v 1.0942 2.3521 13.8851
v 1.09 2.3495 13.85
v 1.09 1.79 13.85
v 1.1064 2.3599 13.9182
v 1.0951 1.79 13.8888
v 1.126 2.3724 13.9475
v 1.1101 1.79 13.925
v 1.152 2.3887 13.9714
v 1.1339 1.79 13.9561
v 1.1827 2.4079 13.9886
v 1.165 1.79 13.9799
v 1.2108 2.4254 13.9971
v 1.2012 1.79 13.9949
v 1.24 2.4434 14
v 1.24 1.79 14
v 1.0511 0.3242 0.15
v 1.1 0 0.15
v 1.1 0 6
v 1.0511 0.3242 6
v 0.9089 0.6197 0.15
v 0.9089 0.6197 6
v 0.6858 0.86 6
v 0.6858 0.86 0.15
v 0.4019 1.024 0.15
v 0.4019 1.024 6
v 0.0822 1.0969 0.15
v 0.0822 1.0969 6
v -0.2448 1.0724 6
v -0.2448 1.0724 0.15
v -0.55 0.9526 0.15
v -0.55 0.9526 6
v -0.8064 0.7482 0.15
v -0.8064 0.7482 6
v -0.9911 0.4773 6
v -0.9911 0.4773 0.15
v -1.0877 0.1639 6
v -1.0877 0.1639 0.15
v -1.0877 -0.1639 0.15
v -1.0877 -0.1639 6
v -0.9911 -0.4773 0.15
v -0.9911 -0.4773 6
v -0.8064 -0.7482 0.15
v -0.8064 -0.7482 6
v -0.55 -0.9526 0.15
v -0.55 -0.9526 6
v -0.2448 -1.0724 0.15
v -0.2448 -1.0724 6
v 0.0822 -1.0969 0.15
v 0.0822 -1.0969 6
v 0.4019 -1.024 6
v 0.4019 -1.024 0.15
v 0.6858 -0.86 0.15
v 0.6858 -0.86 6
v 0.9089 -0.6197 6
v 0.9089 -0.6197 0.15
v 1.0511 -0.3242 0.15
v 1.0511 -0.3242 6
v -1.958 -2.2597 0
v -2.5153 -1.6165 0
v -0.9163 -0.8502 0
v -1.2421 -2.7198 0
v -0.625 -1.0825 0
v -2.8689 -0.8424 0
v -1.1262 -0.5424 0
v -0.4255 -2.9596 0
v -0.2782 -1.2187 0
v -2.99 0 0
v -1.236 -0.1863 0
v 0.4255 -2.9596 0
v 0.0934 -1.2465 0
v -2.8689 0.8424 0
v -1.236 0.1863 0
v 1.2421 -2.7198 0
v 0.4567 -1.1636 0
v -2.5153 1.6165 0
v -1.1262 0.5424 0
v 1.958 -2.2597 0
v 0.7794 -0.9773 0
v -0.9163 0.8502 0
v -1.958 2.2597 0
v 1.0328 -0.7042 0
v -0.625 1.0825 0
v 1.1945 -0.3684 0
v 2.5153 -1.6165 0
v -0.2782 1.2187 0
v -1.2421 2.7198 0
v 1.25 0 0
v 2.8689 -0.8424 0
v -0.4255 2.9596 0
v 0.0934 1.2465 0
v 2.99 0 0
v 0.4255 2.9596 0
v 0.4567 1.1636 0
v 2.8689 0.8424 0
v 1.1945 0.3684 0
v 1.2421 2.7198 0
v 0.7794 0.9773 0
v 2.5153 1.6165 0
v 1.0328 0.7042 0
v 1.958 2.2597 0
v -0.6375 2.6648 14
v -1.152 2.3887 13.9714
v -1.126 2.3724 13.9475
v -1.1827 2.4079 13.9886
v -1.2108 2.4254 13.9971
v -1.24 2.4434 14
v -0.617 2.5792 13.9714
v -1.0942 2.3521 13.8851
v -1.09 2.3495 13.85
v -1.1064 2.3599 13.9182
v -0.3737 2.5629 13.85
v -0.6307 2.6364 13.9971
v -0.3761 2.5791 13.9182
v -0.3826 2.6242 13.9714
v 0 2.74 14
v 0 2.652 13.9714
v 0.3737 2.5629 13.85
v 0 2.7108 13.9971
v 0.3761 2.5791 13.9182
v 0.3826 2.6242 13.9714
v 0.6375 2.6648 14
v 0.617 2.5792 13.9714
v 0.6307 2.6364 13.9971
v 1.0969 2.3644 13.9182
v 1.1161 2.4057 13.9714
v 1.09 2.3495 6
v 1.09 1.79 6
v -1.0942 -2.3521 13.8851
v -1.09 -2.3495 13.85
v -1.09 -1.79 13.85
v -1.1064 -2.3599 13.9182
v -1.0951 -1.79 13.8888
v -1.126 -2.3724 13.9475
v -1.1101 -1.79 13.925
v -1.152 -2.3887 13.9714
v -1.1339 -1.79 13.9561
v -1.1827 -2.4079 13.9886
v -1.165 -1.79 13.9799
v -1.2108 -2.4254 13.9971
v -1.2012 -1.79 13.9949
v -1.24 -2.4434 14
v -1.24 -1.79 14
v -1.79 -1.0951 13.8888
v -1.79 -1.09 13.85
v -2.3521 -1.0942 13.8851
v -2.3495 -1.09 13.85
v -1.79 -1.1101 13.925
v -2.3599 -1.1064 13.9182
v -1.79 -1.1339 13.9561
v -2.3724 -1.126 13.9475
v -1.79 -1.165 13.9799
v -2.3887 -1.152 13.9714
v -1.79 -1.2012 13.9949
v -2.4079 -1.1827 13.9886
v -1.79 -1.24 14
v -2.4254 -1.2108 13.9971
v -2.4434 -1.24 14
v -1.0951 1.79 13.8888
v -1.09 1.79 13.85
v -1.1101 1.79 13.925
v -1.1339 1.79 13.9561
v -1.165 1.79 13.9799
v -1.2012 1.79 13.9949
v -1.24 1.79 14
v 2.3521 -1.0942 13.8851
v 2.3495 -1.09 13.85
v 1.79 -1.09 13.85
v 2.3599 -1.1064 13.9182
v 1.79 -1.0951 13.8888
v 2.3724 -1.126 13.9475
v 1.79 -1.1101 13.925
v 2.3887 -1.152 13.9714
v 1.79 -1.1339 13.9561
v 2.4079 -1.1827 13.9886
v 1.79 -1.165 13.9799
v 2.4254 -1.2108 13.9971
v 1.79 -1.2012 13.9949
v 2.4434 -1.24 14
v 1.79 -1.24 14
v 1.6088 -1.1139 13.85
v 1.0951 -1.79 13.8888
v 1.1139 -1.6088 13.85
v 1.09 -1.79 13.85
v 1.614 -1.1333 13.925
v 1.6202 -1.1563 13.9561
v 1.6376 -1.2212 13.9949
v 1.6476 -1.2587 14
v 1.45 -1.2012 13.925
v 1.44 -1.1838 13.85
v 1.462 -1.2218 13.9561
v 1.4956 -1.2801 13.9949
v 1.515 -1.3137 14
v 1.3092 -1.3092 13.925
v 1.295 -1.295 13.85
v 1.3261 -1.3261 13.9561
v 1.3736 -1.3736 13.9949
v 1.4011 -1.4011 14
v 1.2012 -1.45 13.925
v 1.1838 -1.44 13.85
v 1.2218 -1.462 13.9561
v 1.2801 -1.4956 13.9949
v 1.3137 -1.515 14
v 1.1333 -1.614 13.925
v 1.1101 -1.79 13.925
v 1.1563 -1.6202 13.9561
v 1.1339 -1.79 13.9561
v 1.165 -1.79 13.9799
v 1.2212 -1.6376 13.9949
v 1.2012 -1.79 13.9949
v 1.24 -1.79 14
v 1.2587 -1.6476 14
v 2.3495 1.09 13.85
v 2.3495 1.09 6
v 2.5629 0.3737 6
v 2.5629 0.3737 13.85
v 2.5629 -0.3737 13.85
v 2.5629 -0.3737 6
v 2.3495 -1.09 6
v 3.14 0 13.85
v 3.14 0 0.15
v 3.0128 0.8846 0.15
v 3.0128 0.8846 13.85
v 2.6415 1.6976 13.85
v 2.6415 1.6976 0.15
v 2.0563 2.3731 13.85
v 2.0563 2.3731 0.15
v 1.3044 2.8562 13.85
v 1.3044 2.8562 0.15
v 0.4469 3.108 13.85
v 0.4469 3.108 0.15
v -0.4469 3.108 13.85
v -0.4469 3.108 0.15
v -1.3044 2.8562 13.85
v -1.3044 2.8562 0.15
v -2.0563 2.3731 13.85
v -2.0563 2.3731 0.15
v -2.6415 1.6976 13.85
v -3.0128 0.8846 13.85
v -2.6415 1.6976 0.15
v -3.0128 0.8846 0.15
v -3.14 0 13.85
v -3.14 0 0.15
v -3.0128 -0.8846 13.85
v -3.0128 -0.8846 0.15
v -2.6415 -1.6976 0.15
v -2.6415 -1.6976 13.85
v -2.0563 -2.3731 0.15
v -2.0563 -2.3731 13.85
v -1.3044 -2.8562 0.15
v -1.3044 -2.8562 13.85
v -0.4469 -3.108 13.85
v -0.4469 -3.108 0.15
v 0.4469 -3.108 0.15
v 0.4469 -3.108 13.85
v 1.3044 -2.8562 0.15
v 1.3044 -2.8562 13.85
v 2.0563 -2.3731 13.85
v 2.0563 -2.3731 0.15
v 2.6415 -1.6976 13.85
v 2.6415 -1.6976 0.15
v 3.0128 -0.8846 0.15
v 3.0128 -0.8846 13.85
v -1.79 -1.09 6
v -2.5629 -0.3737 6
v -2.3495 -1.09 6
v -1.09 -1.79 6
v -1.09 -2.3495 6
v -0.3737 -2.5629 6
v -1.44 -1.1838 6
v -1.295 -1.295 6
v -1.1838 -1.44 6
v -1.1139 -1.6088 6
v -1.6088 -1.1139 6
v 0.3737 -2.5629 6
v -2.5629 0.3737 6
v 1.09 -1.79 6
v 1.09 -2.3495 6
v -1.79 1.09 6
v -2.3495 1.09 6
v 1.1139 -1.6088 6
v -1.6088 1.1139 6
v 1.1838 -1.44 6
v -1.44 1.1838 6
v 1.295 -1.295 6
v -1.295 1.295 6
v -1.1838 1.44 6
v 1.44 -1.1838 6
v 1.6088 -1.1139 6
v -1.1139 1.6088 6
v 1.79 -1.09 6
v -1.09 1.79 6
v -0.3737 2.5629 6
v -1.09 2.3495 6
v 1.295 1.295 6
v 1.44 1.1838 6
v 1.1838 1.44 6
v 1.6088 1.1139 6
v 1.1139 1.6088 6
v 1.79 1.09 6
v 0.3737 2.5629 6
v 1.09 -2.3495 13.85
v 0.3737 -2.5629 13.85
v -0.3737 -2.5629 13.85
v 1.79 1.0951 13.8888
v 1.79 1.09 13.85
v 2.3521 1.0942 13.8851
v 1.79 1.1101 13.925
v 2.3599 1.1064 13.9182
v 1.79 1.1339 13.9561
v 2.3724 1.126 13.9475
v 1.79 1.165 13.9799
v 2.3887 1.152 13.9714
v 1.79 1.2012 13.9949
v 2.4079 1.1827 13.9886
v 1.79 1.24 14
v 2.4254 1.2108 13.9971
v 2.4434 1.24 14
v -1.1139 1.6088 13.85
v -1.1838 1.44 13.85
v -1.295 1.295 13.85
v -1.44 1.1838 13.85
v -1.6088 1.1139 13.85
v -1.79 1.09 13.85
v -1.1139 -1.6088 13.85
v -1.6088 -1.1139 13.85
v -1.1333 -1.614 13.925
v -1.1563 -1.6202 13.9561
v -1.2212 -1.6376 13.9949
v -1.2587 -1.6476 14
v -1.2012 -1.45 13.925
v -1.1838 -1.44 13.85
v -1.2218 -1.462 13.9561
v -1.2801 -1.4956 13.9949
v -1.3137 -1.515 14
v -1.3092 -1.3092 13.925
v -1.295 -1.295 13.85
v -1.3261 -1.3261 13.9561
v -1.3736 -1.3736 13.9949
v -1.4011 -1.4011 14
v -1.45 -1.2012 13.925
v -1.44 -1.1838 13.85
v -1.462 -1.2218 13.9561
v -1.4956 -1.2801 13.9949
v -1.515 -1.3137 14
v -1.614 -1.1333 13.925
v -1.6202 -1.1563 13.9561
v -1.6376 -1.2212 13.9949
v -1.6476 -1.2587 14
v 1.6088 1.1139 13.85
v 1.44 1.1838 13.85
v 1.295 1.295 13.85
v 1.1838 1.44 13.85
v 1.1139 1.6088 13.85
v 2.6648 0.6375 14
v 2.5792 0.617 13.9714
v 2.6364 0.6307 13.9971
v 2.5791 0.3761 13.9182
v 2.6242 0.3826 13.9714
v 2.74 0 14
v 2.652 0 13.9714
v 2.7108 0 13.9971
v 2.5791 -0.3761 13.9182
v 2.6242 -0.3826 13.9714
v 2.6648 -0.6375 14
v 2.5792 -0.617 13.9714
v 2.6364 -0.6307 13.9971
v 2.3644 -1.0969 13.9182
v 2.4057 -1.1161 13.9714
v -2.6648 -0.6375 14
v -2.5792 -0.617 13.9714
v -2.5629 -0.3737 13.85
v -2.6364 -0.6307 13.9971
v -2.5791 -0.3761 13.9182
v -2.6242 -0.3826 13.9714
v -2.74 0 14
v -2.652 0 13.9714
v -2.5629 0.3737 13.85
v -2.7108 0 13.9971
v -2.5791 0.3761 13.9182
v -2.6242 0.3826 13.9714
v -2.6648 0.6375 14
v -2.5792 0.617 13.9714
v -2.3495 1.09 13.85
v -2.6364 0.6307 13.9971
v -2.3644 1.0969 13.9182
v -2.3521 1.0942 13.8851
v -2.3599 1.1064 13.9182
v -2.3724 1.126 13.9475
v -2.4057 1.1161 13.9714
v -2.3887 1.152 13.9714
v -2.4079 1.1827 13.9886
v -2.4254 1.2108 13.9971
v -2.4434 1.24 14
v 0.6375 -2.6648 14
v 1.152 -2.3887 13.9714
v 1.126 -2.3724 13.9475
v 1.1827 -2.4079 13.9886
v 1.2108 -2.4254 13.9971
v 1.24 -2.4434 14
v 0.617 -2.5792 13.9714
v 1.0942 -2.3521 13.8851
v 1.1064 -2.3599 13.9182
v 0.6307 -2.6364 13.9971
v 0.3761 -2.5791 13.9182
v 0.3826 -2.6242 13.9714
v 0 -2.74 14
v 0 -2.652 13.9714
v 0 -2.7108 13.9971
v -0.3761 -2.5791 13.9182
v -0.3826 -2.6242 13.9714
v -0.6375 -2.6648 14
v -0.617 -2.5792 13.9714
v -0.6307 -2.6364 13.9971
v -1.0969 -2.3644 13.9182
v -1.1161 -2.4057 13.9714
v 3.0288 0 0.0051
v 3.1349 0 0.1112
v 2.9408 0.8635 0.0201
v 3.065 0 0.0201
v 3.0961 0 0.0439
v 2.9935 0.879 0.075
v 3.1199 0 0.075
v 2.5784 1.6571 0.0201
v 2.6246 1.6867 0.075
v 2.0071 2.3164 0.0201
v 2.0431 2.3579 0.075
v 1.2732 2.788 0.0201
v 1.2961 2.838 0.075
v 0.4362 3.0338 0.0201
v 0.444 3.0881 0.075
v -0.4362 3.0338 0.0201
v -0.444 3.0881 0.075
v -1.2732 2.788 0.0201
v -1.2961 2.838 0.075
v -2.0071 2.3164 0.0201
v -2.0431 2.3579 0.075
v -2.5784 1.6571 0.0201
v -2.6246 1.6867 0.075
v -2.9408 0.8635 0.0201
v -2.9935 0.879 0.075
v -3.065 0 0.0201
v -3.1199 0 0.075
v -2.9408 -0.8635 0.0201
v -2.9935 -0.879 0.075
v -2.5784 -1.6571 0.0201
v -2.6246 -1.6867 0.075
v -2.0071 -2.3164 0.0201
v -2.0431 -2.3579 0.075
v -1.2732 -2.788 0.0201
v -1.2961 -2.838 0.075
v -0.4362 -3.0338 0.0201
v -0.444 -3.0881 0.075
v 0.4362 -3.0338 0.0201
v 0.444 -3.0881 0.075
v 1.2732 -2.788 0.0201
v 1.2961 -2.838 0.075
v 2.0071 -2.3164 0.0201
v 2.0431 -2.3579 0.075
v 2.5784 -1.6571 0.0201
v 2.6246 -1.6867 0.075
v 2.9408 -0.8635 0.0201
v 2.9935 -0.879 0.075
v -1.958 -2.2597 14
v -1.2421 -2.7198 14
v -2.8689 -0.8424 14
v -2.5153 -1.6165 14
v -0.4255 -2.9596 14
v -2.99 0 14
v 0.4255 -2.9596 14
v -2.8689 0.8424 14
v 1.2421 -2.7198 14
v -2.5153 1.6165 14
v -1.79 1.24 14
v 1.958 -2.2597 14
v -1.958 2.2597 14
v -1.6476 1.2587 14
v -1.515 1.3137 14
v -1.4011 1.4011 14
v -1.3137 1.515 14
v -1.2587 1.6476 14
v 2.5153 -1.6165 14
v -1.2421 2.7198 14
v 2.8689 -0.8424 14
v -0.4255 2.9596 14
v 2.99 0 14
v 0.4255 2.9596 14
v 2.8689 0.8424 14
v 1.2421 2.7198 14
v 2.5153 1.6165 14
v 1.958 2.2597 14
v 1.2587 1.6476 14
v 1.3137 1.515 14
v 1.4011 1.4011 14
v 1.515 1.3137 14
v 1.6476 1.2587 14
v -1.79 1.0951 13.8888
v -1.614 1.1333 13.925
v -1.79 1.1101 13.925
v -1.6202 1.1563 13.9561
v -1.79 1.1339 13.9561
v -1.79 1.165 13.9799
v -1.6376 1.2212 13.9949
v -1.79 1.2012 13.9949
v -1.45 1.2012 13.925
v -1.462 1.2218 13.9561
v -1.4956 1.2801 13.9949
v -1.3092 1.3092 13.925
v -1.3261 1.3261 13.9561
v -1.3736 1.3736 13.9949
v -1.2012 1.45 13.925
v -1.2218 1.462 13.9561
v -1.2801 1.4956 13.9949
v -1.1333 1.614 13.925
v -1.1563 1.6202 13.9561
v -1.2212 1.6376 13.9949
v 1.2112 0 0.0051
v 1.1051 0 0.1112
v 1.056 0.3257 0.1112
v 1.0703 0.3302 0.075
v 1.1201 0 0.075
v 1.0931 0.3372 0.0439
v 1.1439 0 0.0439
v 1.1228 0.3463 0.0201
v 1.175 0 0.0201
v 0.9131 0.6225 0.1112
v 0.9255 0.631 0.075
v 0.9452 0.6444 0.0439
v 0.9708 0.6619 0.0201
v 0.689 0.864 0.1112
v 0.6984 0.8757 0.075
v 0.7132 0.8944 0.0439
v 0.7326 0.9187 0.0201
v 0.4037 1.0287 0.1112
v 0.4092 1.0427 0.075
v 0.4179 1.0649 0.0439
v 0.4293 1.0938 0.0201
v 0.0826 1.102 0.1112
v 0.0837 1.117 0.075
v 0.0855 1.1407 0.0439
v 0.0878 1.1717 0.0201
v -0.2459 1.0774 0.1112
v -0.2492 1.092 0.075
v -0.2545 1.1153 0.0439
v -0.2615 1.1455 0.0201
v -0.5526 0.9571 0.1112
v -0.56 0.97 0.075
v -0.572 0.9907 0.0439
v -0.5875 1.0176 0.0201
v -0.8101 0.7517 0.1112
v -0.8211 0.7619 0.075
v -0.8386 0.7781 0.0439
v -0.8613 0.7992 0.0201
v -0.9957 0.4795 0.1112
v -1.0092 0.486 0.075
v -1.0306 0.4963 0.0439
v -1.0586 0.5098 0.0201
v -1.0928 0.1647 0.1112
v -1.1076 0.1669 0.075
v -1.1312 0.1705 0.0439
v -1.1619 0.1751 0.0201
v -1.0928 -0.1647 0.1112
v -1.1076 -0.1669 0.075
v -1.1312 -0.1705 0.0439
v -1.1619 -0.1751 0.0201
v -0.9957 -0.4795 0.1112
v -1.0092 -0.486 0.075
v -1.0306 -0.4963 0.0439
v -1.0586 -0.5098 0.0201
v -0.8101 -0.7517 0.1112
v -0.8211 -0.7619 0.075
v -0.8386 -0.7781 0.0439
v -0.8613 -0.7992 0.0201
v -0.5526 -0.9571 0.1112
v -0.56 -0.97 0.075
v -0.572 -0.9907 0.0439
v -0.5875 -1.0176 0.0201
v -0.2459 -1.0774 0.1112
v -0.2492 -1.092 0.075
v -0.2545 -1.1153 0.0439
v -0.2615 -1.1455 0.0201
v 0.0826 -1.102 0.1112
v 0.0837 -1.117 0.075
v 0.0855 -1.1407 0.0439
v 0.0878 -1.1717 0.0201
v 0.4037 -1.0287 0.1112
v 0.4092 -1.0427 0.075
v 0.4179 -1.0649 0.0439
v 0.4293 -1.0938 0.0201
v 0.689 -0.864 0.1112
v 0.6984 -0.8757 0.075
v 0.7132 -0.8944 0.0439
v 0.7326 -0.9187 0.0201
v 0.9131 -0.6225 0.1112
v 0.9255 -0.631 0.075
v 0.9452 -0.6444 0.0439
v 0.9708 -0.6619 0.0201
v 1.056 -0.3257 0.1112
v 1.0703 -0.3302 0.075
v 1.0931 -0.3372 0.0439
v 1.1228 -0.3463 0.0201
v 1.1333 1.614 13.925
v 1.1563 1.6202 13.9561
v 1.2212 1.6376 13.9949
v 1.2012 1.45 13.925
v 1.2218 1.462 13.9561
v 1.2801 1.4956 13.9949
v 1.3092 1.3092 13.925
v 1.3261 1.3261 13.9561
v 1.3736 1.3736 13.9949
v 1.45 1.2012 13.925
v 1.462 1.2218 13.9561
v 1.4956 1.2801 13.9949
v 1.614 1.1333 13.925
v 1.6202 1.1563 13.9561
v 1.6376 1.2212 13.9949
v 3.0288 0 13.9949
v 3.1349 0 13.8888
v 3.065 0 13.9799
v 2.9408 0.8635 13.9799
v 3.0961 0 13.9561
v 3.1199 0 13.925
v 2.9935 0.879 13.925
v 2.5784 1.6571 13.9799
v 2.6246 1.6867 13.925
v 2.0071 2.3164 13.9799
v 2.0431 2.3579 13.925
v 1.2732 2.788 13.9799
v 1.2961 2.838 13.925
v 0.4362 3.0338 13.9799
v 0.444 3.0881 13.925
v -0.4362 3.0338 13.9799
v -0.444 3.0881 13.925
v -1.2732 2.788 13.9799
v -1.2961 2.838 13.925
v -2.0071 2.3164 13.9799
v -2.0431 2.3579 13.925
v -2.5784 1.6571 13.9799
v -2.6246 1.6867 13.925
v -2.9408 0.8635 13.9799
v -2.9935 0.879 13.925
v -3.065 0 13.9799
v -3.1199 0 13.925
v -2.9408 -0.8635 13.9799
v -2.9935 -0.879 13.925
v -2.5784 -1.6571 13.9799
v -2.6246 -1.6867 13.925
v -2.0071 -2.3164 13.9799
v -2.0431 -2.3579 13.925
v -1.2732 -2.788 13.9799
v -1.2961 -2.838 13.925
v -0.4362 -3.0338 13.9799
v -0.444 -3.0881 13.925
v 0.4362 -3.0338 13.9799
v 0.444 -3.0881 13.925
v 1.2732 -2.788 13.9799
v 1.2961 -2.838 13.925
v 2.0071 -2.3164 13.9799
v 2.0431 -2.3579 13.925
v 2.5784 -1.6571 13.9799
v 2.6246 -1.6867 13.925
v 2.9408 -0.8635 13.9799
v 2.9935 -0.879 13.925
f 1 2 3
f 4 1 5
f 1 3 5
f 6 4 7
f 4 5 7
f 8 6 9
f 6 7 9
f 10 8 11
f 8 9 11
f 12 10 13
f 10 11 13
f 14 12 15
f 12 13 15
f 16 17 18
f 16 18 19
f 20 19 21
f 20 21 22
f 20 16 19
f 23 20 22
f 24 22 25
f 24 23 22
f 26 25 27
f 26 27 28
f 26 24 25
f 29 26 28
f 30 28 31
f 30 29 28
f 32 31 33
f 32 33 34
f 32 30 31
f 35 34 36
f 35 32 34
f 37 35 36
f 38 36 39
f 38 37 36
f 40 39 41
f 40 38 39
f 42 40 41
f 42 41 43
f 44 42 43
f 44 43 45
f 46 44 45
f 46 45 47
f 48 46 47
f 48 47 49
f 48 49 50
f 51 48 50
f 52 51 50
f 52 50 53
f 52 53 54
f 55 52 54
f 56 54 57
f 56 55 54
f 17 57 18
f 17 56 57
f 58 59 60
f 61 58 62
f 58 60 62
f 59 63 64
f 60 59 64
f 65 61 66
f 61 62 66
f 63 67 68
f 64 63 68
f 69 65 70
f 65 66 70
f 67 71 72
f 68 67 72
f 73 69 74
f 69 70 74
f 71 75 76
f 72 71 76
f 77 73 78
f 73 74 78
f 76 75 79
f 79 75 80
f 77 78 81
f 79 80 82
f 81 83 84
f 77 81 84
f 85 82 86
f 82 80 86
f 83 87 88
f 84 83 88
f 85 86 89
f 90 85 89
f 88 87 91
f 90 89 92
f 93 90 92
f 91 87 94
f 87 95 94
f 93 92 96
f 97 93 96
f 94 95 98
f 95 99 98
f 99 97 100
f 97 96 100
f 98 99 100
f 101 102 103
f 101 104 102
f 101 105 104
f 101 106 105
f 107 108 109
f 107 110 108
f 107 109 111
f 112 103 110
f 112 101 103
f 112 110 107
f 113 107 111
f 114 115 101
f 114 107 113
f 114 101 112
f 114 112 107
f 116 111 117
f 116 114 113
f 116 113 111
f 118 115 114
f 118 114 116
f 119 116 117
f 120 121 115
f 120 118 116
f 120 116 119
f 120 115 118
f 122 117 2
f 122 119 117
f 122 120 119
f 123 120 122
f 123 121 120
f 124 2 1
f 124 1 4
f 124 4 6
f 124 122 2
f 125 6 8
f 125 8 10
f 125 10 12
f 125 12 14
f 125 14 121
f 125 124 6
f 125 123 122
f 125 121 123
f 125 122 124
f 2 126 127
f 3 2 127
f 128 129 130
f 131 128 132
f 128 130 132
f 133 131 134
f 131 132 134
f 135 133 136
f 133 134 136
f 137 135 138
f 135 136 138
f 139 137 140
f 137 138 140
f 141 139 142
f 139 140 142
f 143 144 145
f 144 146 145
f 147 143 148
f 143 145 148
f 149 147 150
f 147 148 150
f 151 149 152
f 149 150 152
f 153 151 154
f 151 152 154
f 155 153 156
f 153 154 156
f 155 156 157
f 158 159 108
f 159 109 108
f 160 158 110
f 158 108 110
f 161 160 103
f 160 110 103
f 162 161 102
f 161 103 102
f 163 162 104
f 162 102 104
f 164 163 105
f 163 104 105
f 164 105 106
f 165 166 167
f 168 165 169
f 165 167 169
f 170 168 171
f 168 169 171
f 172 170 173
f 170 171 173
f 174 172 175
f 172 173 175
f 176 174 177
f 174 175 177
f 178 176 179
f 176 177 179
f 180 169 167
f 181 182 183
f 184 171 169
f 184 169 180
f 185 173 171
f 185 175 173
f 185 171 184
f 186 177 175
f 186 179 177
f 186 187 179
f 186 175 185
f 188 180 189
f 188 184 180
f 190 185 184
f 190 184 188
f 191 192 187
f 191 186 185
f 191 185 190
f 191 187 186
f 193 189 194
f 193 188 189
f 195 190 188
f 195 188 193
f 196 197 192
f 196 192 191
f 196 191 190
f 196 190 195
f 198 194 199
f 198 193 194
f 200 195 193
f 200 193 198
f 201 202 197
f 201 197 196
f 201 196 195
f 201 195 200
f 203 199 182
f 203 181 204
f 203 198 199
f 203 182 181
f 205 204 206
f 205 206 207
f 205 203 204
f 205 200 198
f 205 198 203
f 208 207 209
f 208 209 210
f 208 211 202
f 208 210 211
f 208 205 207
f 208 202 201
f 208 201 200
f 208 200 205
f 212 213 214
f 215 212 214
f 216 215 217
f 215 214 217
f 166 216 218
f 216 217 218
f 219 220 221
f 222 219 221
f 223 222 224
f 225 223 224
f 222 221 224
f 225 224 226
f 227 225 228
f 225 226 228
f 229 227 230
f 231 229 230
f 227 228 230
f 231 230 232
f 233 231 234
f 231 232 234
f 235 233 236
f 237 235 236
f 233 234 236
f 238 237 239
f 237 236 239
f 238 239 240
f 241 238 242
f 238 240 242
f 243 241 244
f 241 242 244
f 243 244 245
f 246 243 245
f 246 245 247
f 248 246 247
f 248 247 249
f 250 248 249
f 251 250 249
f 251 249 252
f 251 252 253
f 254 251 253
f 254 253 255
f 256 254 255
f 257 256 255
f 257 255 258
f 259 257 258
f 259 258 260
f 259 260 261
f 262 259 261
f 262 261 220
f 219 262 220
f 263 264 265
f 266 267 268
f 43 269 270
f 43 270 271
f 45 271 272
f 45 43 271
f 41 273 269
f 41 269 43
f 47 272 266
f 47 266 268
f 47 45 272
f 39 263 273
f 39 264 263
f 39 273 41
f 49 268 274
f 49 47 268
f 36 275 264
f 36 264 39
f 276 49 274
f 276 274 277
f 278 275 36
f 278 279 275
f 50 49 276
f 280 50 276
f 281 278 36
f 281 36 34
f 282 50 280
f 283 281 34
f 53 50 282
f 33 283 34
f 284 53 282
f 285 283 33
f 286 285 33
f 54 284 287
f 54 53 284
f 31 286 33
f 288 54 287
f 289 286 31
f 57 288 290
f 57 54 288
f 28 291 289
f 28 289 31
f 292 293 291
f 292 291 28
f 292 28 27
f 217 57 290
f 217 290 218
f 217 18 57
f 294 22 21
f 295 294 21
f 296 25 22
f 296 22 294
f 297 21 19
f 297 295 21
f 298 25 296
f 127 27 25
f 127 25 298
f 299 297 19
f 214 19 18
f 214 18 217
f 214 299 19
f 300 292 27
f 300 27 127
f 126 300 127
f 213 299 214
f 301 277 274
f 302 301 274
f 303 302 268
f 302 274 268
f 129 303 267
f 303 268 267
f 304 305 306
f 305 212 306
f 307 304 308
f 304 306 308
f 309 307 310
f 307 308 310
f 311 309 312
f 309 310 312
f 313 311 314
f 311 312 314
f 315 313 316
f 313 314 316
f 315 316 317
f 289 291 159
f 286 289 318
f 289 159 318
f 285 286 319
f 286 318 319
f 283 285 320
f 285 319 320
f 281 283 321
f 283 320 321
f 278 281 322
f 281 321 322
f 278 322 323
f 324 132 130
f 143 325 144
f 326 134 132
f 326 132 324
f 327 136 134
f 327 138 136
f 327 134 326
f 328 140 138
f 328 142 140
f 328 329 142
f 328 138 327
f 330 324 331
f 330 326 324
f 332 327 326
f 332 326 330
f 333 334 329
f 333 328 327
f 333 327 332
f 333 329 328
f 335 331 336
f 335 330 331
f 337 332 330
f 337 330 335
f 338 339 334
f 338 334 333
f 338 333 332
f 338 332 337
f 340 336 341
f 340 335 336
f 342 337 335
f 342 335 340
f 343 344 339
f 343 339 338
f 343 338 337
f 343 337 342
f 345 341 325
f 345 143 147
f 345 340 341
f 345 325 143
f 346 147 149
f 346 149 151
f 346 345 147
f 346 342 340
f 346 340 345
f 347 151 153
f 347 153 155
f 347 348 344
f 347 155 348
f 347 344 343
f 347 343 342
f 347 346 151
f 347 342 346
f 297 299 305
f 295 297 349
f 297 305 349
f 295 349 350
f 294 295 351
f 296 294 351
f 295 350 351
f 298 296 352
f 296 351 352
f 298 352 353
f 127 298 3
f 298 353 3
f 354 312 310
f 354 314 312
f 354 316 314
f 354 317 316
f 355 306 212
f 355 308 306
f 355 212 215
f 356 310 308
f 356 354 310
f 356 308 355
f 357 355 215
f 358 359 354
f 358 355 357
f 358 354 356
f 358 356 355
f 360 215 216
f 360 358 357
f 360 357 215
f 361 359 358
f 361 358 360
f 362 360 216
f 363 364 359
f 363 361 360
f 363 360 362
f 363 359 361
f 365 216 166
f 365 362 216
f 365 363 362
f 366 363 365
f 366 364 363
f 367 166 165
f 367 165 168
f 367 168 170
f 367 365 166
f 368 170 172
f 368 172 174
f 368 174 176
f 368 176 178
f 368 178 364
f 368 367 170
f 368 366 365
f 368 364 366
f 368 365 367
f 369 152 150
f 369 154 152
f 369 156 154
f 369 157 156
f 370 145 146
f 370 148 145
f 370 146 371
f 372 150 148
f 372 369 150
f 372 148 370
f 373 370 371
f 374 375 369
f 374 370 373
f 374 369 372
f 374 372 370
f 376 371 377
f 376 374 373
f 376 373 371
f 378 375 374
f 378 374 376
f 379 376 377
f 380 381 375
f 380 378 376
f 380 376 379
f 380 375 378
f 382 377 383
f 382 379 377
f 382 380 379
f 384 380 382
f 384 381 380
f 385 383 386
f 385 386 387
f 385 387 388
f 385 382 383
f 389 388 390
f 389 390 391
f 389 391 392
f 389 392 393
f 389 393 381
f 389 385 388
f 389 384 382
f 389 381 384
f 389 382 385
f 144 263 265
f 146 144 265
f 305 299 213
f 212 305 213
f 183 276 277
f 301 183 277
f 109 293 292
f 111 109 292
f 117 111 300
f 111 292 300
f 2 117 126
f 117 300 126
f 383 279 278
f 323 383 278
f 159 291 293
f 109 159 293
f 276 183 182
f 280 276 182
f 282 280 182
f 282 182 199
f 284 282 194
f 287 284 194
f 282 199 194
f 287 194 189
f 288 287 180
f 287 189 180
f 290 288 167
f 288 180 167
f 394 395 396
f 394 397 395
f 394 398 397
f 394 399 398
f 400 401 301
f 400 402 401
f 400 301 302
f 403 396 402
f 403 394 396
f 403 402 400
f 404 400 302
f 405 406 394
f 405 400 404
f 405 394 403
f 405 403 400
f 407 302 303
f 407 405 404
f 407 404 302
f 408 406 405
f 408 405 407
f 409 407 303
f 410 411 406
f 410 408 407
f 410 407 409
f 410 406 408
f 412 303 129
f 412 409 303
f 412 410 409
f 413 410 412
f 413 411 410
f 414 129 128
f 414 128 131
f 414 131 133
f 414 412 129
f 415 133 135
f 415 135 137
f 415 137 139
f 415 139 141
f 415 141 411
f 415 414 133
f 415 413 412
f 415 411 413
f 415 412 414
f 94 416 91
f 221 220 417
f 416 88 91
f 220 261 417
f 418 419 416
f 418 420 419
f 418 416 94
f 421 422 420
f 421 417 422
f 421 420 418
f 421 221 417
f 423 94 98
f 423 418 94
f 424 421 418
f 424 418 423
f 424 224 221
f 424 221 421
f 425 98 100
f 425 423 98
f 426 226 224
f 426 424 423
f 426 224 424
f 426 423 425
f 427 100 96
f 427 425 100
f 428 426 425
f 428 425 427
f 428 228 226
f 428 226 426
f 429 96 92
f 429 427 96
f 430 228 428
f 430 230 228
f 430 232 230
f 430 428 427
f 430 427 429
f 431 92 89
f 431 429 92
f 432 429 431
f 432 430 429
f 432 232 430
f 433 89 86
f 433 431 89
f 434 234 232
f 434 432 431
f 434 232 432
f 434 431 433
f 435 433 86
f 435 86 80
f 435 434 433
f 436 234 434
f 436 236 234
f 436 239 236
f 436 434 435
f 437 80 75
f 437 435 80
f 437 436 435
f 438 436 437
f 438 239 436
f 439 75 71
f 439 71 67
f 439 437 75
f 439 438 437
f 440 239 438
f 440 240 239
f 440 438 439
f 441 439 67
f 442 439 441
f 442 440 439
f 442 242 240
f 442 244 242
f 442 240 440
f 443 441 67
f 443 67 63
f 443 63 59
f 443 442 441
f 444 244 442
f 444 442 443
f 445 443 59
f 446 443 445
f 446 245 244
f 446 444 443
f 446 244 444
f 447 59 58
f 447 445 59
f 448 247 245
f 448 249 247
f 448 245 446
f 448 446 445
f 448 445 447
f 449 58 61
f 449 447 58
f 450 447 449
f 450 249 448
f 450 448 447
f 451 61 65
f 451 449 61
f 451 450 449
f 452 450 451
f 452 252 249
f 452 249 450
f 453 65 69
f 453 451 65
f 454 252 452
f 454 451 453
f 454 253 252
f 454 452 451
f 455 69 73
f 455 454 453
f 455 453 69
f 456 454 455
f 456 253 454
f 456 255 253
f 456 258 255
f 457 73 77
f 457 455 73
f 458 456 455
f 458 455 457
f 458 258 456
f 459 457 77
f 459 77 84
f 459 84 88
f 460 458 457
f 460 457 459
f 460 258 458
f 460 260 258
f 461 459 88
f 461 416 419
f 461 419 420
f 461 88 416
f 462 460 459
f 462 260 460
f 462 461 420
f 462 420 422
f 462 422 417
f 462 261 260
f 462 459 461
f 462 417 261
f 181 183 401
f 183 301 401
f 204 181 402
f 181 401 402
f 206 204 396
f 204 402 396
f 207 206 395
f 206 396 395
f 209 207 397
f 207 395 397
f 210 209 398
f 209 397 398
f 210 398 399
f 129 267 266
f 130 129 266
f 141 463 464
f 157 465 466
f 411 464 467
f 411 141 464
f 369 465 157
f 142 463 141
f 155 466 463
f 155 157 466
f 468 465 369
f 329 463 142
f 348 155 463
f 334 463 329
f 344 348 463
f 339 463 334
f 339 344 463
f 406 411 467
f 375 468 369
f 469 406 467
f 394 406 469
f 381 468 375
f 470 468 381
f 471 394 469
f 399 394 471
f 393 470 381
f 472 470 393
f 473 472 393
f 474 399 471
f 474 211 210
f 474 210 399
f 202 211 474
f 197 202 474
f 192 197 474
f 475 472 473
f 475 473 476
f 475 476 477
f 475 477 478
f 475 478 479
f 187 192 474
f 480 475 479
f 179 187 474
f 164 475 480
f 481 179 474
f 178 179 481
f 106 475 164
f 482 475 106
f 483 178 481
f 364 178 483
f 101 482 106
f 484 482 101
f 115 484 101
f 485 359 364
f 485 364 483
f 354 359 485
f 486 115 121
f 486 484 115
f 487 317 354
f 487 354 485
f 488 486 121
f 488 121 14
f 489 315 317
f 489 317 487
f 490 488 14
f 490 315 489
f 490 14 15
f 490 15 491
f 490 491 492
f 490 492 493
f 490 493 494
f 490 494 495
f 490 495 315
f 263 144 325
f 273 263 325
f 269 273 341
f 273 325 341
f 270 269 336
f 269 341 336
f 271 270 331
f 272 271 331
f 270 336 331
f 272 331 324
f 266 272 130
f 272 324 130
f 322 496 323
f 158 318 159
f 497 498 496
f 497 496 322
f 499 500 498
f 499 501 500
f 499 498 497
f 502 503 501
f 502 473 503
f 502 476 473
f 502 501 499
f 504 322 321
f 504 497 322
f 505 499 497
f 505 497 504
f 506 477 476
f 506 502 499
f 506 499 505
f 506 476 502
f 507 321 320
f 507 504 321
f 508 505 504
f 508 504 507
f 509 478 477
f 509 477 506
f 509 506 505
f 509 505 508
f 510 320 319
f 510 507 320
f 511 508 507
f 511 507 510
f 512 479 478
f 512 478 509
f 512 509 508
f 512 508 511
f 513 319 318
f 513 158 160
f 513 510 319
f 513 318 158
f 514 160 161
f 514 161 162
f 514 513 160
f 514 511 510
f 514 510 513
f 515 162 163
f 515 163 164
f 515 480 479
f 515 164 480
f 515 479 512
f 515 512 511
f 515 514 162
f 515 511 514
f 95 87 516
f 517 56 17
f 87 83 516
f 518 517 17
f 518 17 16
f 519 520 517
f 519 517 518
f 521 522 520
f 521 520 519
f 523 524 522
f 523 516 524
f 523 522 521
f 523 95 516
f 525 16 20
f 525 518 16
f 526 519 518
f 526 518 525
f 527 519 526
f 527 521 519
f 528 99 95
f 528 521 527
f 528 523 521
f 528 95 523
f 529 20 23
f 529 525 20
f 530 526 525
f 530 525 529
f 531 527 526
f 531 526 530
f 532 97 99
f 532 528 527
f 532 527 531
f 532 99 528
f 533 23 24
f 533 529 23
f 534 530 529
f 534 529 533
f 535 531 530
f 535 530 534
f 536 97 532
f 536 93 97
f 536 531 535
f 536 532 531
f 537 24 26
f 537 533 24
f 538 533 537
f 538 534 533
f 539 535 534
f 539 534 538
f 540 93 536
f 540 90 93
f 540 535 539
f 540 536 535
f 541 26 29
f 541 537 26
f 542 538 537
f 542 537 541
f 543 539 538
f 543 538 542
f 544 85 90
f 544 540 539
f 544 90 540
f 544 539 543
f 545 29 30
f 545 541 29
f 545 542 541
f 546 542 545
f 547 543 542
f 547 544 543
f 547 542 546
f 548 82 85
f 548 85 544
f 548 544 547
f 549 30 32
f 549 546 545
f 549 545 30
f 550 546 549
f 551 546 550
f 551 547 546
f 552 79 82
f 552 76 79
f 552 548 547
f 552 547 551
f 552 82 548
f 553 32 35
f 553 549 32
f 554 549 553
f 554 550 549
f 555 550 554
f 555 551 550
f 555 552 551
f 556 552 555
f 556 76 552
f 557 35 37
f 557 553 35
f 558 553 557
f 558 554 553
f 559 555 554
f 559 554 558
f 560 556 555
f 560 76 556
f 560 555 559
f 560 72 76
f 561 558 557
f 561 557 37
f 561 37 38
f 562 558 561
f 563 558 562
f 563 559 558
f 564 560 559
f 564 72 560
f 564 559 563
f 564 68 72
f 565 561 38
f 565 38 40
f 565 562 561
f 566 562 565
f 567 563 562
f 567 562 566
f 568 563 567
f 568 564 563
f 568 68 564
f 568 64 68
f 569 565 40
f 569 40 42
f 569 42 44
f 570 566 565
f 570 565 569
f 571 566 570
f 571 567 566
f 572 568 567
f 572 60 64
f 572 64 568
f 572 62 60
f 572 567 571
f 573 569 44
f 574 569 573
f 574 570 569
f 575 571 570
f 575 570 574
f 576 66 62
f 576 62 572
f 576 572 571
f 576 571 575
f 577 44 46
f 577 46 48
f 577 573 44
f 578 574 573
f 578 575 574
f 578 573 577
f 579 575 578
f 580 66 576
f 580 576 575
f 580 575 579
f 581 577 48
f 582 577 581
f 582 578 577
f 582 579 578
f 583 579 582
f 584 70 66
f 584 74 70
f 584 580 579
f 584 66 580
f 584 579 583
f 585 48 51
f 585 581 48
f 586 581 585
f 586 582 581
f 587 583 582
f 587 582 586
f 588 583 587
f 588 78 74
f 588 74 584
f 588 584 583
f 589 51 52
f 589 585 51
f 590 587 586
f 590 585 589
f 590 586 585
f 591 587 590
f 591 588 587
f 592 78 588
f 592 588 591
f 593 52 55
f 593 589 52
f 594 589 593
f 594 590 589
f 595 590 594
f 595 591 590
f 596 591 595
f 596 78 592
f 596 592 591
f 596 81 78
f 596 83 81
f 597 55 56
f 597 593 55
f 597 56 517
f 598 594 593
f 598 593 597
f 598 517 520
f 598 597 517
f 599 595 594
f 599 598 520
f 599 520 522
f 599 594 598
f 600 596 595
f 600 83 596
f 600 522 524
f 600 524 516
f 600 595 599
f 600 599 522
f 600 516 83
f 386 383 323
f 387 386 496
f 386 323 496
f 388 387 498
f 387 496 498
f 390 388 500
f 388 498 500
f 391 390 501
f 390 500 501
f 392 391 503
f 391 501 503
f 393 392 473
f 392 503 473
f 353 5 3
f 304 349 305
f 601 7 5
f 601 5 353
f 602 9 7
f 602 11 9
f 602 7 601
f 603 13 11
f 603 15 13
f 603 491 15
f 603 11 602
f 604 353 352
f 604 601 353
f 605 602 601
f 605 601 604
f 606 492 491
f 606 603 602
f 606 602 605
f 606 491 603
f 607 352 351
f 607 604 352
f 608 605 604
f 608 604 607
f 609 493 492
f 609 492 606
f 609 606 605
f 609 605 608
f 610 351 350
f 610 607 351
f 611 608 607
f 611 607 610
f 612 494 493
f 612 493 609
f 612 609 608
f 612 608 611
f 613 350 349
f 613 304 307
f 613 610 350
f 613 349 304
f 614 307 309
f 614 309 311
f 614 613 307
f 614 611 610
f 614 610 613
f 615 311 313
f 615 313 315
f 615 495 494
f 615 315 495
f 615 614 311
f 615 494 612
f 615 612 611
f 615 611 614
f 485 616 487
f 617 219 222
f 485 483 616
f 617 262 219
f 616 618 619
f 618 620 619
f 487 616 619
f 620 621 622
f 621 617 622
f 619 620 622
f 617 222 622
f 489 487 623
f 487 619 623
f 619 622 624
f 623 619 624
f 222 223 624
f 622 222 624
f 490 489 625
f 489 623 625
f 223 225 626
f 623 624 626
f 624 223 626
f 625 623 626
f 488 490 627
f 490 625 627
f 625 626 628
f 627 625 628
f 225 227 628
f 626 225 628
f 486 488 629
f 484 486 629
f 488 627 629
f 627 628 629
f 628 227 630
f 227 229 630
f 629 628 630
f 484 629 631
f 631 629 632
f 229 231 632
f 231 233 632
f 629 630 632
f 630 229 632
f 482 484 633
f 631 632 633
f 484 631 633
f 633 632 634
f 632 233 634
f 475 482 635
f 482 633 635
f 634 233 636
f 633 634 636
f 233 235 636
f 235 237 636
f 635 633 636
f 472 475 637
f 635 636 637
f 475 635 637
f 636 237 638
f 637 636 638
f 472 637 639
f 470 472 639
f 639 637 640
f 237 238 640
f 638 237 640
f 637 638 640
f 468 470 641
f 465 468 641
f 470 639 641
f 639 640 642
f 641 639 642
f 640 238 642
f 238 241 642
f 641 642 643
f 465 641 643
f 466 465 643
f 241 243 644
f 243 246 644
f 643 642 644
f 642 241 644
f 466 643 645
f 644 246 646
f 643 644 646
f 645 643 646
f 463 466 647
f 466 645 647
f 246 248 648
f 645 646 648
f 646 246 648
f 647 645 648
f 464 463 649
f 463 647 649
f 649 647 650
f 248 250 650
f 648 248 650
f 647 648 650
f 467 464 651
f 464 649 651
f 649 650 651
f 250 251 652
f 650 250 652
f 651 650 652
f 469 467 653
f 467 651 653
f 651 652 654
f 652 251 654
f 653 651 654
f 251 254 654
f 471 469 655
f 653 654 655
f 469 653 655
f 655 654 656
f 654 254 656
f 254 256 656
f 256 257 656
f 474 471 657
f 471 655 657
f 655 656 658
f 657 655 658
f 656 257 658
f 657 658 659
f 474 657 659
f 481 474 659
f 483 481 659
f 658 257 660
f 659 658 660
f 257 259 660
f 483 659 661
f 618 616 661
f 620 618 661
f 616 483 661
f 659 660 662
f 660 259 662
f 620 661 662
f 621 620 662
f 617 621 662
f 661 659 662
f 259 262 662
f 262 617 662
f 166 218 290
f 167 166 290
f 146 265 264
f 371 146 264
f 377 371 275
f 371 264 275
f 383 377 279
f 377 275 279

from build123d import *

# Parameters (mm, degrees)
SKETCH1_R           = 3.14
SKETCH1_R_2         = 1.1
BOSS_EXTRUDE1_DEPTH = 6
SKETCH2_R           = 3.14
BOSS_EXTRUDE3_DEPTH = 8
FILLET2_R           = 0.7
FILLET3_R           = 0.15
FILLET4_R           = 0.15


with BuildPart() as part:
    # Sketch1 → Boss-Extrude1 (new body)
    with BuildSketch(Plane.XY):
        Circle(SKETCH1_R)
        Circle(SKETCH1_R_2, mode=Mode.SUBTRACT)
    extrude(amount=BOSS_EXTRUDE1_DEPTH)

    # Sketch2 → Boss-Extrude3 (add)
    with BuildSketch(Plane.XY.offset(6)):
        Circle(SKETCH2_R)
        with BuildLine():
            Line((1.09, 1.09), (2.349468025, 1.09))
            ThreePointArc((2.349468025, 1.09), (2.59, 0), (2.349468025, -1.09))
            Line((2.349468025, -1.09), (1.09, -1.09))
            Line((1.09, -1.09), (1.09, -2.349468025))
            ThreePointArc((1.09, -2.349468025), (0, -2.59), (-1.09, -2.349468025))
            Line((-1.09, -2.349468025), (-1.09, -1.09))
            Line((-1.09, -1.09), (-2.349468025, -1.09))
            ThreePointArc((-2.349468025, -1.09), (-2.59, 0), (-2.349468025, 1.09))
            Line((-2.349468025, 1.09), (-1.09, 1.09))
            Line((-1.09, 1.09), (-1.09, 2.349468025))
            ThreePointArc((-1.09, 2.349468025), (0, 2.59), (1.09, 2.349468025))
            Line((1.09, 2.349468025), (1.09, 1.09))
        make_face(mode=Mode.SUBTRACT)
    extrude(amount=BOSS_EXTRUDE3_DEPTH)

    # Fillet2
    fillet2_edges = [part.edges().sort_by_distance(p)[0] for p in [
        (-1.09, -1.09, 10),
        (-1.09, 1.09, 10),
        (1.09, 1.09, 10),
        (1.09, -1.09, 10),
    ]]
    fillet(fillet2_edges, radius=FILLET2_R)

    # Fillet3
    fillet3_edges = [part.edges().sort_by_distance(p)[0] for p in [
        (-3.14, 0, 0),
        (-1.1, 0, 0),
    ]]
    fillet(fillet3_edges, radius=FILLET3_R)

    # Fillet4
    fillet4_edges = [part.edges().sort_by_distance(p)[0] for p in [
        (0, -2.59, 14),
        (-2.59, 0, 14),
        (2.59, 0, 14),
        (-1.09, -2.069734012, 14),
        (-2.069734012, 1.09, 14),
        (0, 2.59, 14),
        (2.069734012, -1.09, 14),
        (-3.14, 0, 14),
        (-1.09, 2.069734012, 14),
        (-2.069734012, -1.09, 14),
        (1.09, 2.069734012, 14),
        (2.069734012, 1.09, 14),
        (1.09, -2.069734012, 14),
        (-1.295025253, -1.295025253, 14),
        (1.295025253, -1.295025253, 14),
        (1.295025253, 1.295025253, 14),
        (-1.295025253, 1.295025253, 14),
    ]]
    fillet(fillet4_edges, radius=FILLET4_R)


solid = part.part
